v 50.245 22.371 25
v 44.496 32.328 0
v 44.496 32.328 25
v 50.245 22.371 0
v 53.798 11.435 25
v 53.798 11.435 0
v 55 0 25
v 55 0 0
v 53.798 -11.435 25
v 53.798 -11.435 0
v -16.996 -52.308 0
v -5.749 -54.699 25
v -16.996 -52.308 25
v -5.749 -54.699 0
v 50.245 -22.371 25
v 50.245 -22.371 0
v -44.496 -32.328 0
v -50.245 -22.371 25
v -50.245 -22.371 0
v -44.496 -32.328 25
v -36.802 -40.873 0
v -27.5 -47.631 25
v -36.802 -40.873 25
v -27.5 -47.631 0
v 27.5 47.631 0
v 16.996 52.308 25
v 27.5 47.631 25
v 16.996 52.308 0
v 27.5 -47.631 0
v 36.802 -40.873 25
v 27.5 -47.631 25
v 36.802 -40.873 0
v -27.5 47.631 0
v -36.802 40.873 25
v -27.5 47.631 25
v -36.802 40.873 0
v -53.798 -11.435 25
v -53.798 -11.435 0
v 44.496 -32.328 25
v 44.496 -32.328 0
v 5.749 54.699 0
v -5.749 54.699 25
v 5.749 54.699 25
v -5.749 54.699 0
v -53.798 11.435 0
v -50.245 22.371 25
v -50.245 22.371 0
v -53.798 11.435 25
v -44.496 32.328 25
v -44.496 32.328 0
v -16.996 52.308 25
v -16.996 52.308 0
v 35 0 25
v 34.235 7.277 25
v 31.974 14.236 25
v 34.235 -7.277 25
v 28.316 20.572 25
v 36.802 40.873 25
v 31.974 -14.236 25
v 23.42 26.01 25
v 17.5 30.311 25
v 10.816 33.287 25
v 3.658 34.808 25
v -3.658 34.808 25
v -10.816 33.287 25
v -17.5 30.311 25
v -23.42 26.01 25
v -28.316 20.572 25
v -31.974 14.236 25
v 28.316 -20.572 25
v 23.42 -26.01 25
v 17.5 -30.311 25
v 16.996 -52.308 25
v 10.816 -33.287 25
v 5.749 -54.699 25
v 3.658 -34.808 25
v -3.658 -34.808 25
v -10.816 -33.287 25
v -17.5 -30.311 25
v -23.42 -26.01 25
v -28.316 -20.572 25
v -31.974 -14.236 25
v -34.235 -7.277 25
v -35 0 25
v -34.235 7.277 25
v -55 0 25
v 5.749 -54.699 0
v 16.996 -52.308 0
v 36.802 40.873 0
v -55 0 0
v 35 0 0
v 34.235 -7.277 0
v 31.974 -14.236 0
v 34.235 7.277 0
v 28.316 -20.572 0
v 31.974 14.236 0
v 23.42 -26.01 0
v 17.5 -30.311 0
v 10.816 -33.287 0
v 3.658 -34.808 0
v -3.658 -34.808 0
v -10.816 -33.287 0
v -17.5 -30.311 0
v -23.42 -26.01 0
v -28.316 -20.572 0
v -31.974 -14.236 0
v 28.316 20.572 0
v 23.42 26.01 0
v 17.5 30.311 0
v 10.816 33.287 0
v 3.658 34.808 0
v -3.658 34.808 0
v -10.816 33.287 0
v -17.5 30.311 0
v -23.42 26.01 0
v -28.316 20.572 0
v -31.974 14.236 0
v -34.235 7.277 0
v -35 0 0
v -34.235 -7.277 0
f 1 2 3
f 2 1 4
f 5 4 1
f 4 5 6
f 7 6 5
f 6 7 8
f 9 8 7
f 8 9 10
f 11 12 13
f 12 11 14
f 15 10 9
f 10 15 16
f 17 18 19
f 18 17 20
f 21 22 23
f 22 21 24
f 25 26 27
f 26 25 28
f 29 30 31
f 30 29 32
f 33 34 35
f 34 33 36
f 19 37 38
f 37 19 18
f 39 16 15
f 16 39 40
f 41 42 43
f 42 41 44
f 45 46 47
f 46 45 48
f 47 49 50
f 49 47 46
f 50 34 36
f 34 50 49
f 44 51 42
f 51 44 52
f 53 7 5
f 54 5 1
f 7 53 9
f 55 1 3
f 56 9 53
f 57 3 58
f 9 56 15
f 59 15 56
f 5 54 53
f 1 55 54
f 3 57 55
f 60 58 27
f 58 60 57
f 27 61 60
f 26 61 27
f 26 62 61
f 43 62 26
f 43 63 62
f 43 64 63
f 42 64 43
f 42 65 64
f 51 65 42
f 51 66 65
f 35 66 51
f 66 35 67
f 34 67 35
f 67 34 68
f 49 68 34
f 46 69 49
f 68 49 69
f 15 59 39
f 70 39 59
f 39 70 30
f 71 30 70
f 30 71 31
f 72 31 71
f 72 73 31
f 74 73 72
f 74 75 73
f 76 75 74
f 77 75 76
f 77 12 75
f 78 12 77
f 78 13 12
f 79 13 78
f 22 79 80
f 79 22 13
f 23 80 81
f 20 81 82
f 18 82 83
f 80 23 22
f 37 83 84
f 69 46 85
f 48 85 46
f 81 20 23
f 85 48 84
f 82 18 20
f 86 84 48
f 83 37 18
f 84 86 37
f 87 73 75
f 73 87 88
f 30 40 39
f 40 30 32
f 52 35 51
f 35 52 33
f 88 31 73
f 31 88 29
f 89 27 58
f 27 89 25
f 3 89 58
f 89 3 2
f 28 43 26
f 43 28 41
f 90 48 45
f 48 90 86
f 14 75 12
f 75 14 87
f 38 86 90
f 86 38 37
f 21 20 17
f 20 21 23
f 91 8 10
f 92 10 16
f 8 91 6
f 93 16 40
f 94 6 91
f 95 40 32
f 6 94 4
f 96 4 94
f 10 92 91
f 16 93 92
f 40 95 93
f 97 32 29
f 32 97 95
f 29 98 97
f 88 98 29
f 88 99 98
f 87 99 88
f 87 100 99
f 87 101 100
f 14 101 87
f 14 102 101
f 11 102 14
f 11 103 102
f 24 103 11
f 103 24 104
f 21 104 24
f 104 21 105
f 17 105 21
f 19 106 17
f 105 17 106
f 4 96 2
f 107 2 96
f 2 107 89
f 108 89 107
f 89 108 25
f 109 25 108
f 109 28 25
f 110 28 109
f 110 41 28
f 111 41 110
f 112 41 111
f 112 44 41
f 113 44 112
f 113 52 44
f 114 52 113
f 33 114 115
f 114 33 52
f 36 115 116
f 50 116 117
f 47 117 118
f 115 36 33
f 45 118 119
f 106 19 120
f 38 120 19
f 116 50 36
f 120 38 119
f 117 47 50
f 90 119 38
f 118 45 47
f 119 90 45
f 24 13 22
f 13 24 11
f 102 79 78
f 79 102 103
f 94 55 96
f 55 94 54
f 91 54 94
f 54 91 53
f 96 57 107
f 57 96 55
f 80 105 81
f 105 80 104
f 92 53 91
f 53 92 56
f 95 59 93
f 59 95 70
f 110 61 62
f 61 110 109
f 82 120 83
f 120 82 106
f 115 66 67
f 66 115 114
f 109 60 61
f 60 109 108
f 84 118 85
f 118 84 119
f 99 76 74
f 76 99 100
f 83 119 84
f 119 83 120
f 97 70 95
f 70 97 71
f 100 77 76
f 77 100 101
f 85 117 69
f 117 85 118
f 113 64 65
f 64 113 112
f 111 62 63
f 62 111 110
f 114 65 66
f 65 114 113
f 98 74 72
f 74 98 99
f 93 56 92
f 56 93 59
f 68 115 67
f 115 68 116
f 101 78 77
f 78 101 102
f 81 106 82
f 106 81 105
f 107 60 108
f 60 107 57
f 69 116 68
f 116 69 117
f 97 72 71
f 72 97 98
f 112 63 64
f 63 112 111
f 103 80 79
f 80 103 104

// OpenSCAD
// file: wind_params.scad
/*
 * Copyright (c) 2012 Haydn Vestal
 * 
 * See the file license.txt for copying permission.
 *
 */


// FRAME
frame_thickness = 10;

// BLADE
blade_thickness = 3;
blade_count = 3;

// BEARING
bearing_ir = 35;
bearing_or = 55;
bearing_height = 25;

// POLE CAP
pole_radius = 12.7;
pole_cap_height = 80;
swivel_ir = 22.5;
swivel_or = 32.5;
// main file
/*
 * Copyright (c) 2012 Haydn Vestal
 * 
 * See the file license.txt for copying permission.
 *
 */

include <wind_params.scad>


module bearing() {
  difference() {
    cylinder(h=bearing_height, r=bearing_or);
    cylinder(h=bearing_height, r=bearing_ir);
  }
}

bearing();
